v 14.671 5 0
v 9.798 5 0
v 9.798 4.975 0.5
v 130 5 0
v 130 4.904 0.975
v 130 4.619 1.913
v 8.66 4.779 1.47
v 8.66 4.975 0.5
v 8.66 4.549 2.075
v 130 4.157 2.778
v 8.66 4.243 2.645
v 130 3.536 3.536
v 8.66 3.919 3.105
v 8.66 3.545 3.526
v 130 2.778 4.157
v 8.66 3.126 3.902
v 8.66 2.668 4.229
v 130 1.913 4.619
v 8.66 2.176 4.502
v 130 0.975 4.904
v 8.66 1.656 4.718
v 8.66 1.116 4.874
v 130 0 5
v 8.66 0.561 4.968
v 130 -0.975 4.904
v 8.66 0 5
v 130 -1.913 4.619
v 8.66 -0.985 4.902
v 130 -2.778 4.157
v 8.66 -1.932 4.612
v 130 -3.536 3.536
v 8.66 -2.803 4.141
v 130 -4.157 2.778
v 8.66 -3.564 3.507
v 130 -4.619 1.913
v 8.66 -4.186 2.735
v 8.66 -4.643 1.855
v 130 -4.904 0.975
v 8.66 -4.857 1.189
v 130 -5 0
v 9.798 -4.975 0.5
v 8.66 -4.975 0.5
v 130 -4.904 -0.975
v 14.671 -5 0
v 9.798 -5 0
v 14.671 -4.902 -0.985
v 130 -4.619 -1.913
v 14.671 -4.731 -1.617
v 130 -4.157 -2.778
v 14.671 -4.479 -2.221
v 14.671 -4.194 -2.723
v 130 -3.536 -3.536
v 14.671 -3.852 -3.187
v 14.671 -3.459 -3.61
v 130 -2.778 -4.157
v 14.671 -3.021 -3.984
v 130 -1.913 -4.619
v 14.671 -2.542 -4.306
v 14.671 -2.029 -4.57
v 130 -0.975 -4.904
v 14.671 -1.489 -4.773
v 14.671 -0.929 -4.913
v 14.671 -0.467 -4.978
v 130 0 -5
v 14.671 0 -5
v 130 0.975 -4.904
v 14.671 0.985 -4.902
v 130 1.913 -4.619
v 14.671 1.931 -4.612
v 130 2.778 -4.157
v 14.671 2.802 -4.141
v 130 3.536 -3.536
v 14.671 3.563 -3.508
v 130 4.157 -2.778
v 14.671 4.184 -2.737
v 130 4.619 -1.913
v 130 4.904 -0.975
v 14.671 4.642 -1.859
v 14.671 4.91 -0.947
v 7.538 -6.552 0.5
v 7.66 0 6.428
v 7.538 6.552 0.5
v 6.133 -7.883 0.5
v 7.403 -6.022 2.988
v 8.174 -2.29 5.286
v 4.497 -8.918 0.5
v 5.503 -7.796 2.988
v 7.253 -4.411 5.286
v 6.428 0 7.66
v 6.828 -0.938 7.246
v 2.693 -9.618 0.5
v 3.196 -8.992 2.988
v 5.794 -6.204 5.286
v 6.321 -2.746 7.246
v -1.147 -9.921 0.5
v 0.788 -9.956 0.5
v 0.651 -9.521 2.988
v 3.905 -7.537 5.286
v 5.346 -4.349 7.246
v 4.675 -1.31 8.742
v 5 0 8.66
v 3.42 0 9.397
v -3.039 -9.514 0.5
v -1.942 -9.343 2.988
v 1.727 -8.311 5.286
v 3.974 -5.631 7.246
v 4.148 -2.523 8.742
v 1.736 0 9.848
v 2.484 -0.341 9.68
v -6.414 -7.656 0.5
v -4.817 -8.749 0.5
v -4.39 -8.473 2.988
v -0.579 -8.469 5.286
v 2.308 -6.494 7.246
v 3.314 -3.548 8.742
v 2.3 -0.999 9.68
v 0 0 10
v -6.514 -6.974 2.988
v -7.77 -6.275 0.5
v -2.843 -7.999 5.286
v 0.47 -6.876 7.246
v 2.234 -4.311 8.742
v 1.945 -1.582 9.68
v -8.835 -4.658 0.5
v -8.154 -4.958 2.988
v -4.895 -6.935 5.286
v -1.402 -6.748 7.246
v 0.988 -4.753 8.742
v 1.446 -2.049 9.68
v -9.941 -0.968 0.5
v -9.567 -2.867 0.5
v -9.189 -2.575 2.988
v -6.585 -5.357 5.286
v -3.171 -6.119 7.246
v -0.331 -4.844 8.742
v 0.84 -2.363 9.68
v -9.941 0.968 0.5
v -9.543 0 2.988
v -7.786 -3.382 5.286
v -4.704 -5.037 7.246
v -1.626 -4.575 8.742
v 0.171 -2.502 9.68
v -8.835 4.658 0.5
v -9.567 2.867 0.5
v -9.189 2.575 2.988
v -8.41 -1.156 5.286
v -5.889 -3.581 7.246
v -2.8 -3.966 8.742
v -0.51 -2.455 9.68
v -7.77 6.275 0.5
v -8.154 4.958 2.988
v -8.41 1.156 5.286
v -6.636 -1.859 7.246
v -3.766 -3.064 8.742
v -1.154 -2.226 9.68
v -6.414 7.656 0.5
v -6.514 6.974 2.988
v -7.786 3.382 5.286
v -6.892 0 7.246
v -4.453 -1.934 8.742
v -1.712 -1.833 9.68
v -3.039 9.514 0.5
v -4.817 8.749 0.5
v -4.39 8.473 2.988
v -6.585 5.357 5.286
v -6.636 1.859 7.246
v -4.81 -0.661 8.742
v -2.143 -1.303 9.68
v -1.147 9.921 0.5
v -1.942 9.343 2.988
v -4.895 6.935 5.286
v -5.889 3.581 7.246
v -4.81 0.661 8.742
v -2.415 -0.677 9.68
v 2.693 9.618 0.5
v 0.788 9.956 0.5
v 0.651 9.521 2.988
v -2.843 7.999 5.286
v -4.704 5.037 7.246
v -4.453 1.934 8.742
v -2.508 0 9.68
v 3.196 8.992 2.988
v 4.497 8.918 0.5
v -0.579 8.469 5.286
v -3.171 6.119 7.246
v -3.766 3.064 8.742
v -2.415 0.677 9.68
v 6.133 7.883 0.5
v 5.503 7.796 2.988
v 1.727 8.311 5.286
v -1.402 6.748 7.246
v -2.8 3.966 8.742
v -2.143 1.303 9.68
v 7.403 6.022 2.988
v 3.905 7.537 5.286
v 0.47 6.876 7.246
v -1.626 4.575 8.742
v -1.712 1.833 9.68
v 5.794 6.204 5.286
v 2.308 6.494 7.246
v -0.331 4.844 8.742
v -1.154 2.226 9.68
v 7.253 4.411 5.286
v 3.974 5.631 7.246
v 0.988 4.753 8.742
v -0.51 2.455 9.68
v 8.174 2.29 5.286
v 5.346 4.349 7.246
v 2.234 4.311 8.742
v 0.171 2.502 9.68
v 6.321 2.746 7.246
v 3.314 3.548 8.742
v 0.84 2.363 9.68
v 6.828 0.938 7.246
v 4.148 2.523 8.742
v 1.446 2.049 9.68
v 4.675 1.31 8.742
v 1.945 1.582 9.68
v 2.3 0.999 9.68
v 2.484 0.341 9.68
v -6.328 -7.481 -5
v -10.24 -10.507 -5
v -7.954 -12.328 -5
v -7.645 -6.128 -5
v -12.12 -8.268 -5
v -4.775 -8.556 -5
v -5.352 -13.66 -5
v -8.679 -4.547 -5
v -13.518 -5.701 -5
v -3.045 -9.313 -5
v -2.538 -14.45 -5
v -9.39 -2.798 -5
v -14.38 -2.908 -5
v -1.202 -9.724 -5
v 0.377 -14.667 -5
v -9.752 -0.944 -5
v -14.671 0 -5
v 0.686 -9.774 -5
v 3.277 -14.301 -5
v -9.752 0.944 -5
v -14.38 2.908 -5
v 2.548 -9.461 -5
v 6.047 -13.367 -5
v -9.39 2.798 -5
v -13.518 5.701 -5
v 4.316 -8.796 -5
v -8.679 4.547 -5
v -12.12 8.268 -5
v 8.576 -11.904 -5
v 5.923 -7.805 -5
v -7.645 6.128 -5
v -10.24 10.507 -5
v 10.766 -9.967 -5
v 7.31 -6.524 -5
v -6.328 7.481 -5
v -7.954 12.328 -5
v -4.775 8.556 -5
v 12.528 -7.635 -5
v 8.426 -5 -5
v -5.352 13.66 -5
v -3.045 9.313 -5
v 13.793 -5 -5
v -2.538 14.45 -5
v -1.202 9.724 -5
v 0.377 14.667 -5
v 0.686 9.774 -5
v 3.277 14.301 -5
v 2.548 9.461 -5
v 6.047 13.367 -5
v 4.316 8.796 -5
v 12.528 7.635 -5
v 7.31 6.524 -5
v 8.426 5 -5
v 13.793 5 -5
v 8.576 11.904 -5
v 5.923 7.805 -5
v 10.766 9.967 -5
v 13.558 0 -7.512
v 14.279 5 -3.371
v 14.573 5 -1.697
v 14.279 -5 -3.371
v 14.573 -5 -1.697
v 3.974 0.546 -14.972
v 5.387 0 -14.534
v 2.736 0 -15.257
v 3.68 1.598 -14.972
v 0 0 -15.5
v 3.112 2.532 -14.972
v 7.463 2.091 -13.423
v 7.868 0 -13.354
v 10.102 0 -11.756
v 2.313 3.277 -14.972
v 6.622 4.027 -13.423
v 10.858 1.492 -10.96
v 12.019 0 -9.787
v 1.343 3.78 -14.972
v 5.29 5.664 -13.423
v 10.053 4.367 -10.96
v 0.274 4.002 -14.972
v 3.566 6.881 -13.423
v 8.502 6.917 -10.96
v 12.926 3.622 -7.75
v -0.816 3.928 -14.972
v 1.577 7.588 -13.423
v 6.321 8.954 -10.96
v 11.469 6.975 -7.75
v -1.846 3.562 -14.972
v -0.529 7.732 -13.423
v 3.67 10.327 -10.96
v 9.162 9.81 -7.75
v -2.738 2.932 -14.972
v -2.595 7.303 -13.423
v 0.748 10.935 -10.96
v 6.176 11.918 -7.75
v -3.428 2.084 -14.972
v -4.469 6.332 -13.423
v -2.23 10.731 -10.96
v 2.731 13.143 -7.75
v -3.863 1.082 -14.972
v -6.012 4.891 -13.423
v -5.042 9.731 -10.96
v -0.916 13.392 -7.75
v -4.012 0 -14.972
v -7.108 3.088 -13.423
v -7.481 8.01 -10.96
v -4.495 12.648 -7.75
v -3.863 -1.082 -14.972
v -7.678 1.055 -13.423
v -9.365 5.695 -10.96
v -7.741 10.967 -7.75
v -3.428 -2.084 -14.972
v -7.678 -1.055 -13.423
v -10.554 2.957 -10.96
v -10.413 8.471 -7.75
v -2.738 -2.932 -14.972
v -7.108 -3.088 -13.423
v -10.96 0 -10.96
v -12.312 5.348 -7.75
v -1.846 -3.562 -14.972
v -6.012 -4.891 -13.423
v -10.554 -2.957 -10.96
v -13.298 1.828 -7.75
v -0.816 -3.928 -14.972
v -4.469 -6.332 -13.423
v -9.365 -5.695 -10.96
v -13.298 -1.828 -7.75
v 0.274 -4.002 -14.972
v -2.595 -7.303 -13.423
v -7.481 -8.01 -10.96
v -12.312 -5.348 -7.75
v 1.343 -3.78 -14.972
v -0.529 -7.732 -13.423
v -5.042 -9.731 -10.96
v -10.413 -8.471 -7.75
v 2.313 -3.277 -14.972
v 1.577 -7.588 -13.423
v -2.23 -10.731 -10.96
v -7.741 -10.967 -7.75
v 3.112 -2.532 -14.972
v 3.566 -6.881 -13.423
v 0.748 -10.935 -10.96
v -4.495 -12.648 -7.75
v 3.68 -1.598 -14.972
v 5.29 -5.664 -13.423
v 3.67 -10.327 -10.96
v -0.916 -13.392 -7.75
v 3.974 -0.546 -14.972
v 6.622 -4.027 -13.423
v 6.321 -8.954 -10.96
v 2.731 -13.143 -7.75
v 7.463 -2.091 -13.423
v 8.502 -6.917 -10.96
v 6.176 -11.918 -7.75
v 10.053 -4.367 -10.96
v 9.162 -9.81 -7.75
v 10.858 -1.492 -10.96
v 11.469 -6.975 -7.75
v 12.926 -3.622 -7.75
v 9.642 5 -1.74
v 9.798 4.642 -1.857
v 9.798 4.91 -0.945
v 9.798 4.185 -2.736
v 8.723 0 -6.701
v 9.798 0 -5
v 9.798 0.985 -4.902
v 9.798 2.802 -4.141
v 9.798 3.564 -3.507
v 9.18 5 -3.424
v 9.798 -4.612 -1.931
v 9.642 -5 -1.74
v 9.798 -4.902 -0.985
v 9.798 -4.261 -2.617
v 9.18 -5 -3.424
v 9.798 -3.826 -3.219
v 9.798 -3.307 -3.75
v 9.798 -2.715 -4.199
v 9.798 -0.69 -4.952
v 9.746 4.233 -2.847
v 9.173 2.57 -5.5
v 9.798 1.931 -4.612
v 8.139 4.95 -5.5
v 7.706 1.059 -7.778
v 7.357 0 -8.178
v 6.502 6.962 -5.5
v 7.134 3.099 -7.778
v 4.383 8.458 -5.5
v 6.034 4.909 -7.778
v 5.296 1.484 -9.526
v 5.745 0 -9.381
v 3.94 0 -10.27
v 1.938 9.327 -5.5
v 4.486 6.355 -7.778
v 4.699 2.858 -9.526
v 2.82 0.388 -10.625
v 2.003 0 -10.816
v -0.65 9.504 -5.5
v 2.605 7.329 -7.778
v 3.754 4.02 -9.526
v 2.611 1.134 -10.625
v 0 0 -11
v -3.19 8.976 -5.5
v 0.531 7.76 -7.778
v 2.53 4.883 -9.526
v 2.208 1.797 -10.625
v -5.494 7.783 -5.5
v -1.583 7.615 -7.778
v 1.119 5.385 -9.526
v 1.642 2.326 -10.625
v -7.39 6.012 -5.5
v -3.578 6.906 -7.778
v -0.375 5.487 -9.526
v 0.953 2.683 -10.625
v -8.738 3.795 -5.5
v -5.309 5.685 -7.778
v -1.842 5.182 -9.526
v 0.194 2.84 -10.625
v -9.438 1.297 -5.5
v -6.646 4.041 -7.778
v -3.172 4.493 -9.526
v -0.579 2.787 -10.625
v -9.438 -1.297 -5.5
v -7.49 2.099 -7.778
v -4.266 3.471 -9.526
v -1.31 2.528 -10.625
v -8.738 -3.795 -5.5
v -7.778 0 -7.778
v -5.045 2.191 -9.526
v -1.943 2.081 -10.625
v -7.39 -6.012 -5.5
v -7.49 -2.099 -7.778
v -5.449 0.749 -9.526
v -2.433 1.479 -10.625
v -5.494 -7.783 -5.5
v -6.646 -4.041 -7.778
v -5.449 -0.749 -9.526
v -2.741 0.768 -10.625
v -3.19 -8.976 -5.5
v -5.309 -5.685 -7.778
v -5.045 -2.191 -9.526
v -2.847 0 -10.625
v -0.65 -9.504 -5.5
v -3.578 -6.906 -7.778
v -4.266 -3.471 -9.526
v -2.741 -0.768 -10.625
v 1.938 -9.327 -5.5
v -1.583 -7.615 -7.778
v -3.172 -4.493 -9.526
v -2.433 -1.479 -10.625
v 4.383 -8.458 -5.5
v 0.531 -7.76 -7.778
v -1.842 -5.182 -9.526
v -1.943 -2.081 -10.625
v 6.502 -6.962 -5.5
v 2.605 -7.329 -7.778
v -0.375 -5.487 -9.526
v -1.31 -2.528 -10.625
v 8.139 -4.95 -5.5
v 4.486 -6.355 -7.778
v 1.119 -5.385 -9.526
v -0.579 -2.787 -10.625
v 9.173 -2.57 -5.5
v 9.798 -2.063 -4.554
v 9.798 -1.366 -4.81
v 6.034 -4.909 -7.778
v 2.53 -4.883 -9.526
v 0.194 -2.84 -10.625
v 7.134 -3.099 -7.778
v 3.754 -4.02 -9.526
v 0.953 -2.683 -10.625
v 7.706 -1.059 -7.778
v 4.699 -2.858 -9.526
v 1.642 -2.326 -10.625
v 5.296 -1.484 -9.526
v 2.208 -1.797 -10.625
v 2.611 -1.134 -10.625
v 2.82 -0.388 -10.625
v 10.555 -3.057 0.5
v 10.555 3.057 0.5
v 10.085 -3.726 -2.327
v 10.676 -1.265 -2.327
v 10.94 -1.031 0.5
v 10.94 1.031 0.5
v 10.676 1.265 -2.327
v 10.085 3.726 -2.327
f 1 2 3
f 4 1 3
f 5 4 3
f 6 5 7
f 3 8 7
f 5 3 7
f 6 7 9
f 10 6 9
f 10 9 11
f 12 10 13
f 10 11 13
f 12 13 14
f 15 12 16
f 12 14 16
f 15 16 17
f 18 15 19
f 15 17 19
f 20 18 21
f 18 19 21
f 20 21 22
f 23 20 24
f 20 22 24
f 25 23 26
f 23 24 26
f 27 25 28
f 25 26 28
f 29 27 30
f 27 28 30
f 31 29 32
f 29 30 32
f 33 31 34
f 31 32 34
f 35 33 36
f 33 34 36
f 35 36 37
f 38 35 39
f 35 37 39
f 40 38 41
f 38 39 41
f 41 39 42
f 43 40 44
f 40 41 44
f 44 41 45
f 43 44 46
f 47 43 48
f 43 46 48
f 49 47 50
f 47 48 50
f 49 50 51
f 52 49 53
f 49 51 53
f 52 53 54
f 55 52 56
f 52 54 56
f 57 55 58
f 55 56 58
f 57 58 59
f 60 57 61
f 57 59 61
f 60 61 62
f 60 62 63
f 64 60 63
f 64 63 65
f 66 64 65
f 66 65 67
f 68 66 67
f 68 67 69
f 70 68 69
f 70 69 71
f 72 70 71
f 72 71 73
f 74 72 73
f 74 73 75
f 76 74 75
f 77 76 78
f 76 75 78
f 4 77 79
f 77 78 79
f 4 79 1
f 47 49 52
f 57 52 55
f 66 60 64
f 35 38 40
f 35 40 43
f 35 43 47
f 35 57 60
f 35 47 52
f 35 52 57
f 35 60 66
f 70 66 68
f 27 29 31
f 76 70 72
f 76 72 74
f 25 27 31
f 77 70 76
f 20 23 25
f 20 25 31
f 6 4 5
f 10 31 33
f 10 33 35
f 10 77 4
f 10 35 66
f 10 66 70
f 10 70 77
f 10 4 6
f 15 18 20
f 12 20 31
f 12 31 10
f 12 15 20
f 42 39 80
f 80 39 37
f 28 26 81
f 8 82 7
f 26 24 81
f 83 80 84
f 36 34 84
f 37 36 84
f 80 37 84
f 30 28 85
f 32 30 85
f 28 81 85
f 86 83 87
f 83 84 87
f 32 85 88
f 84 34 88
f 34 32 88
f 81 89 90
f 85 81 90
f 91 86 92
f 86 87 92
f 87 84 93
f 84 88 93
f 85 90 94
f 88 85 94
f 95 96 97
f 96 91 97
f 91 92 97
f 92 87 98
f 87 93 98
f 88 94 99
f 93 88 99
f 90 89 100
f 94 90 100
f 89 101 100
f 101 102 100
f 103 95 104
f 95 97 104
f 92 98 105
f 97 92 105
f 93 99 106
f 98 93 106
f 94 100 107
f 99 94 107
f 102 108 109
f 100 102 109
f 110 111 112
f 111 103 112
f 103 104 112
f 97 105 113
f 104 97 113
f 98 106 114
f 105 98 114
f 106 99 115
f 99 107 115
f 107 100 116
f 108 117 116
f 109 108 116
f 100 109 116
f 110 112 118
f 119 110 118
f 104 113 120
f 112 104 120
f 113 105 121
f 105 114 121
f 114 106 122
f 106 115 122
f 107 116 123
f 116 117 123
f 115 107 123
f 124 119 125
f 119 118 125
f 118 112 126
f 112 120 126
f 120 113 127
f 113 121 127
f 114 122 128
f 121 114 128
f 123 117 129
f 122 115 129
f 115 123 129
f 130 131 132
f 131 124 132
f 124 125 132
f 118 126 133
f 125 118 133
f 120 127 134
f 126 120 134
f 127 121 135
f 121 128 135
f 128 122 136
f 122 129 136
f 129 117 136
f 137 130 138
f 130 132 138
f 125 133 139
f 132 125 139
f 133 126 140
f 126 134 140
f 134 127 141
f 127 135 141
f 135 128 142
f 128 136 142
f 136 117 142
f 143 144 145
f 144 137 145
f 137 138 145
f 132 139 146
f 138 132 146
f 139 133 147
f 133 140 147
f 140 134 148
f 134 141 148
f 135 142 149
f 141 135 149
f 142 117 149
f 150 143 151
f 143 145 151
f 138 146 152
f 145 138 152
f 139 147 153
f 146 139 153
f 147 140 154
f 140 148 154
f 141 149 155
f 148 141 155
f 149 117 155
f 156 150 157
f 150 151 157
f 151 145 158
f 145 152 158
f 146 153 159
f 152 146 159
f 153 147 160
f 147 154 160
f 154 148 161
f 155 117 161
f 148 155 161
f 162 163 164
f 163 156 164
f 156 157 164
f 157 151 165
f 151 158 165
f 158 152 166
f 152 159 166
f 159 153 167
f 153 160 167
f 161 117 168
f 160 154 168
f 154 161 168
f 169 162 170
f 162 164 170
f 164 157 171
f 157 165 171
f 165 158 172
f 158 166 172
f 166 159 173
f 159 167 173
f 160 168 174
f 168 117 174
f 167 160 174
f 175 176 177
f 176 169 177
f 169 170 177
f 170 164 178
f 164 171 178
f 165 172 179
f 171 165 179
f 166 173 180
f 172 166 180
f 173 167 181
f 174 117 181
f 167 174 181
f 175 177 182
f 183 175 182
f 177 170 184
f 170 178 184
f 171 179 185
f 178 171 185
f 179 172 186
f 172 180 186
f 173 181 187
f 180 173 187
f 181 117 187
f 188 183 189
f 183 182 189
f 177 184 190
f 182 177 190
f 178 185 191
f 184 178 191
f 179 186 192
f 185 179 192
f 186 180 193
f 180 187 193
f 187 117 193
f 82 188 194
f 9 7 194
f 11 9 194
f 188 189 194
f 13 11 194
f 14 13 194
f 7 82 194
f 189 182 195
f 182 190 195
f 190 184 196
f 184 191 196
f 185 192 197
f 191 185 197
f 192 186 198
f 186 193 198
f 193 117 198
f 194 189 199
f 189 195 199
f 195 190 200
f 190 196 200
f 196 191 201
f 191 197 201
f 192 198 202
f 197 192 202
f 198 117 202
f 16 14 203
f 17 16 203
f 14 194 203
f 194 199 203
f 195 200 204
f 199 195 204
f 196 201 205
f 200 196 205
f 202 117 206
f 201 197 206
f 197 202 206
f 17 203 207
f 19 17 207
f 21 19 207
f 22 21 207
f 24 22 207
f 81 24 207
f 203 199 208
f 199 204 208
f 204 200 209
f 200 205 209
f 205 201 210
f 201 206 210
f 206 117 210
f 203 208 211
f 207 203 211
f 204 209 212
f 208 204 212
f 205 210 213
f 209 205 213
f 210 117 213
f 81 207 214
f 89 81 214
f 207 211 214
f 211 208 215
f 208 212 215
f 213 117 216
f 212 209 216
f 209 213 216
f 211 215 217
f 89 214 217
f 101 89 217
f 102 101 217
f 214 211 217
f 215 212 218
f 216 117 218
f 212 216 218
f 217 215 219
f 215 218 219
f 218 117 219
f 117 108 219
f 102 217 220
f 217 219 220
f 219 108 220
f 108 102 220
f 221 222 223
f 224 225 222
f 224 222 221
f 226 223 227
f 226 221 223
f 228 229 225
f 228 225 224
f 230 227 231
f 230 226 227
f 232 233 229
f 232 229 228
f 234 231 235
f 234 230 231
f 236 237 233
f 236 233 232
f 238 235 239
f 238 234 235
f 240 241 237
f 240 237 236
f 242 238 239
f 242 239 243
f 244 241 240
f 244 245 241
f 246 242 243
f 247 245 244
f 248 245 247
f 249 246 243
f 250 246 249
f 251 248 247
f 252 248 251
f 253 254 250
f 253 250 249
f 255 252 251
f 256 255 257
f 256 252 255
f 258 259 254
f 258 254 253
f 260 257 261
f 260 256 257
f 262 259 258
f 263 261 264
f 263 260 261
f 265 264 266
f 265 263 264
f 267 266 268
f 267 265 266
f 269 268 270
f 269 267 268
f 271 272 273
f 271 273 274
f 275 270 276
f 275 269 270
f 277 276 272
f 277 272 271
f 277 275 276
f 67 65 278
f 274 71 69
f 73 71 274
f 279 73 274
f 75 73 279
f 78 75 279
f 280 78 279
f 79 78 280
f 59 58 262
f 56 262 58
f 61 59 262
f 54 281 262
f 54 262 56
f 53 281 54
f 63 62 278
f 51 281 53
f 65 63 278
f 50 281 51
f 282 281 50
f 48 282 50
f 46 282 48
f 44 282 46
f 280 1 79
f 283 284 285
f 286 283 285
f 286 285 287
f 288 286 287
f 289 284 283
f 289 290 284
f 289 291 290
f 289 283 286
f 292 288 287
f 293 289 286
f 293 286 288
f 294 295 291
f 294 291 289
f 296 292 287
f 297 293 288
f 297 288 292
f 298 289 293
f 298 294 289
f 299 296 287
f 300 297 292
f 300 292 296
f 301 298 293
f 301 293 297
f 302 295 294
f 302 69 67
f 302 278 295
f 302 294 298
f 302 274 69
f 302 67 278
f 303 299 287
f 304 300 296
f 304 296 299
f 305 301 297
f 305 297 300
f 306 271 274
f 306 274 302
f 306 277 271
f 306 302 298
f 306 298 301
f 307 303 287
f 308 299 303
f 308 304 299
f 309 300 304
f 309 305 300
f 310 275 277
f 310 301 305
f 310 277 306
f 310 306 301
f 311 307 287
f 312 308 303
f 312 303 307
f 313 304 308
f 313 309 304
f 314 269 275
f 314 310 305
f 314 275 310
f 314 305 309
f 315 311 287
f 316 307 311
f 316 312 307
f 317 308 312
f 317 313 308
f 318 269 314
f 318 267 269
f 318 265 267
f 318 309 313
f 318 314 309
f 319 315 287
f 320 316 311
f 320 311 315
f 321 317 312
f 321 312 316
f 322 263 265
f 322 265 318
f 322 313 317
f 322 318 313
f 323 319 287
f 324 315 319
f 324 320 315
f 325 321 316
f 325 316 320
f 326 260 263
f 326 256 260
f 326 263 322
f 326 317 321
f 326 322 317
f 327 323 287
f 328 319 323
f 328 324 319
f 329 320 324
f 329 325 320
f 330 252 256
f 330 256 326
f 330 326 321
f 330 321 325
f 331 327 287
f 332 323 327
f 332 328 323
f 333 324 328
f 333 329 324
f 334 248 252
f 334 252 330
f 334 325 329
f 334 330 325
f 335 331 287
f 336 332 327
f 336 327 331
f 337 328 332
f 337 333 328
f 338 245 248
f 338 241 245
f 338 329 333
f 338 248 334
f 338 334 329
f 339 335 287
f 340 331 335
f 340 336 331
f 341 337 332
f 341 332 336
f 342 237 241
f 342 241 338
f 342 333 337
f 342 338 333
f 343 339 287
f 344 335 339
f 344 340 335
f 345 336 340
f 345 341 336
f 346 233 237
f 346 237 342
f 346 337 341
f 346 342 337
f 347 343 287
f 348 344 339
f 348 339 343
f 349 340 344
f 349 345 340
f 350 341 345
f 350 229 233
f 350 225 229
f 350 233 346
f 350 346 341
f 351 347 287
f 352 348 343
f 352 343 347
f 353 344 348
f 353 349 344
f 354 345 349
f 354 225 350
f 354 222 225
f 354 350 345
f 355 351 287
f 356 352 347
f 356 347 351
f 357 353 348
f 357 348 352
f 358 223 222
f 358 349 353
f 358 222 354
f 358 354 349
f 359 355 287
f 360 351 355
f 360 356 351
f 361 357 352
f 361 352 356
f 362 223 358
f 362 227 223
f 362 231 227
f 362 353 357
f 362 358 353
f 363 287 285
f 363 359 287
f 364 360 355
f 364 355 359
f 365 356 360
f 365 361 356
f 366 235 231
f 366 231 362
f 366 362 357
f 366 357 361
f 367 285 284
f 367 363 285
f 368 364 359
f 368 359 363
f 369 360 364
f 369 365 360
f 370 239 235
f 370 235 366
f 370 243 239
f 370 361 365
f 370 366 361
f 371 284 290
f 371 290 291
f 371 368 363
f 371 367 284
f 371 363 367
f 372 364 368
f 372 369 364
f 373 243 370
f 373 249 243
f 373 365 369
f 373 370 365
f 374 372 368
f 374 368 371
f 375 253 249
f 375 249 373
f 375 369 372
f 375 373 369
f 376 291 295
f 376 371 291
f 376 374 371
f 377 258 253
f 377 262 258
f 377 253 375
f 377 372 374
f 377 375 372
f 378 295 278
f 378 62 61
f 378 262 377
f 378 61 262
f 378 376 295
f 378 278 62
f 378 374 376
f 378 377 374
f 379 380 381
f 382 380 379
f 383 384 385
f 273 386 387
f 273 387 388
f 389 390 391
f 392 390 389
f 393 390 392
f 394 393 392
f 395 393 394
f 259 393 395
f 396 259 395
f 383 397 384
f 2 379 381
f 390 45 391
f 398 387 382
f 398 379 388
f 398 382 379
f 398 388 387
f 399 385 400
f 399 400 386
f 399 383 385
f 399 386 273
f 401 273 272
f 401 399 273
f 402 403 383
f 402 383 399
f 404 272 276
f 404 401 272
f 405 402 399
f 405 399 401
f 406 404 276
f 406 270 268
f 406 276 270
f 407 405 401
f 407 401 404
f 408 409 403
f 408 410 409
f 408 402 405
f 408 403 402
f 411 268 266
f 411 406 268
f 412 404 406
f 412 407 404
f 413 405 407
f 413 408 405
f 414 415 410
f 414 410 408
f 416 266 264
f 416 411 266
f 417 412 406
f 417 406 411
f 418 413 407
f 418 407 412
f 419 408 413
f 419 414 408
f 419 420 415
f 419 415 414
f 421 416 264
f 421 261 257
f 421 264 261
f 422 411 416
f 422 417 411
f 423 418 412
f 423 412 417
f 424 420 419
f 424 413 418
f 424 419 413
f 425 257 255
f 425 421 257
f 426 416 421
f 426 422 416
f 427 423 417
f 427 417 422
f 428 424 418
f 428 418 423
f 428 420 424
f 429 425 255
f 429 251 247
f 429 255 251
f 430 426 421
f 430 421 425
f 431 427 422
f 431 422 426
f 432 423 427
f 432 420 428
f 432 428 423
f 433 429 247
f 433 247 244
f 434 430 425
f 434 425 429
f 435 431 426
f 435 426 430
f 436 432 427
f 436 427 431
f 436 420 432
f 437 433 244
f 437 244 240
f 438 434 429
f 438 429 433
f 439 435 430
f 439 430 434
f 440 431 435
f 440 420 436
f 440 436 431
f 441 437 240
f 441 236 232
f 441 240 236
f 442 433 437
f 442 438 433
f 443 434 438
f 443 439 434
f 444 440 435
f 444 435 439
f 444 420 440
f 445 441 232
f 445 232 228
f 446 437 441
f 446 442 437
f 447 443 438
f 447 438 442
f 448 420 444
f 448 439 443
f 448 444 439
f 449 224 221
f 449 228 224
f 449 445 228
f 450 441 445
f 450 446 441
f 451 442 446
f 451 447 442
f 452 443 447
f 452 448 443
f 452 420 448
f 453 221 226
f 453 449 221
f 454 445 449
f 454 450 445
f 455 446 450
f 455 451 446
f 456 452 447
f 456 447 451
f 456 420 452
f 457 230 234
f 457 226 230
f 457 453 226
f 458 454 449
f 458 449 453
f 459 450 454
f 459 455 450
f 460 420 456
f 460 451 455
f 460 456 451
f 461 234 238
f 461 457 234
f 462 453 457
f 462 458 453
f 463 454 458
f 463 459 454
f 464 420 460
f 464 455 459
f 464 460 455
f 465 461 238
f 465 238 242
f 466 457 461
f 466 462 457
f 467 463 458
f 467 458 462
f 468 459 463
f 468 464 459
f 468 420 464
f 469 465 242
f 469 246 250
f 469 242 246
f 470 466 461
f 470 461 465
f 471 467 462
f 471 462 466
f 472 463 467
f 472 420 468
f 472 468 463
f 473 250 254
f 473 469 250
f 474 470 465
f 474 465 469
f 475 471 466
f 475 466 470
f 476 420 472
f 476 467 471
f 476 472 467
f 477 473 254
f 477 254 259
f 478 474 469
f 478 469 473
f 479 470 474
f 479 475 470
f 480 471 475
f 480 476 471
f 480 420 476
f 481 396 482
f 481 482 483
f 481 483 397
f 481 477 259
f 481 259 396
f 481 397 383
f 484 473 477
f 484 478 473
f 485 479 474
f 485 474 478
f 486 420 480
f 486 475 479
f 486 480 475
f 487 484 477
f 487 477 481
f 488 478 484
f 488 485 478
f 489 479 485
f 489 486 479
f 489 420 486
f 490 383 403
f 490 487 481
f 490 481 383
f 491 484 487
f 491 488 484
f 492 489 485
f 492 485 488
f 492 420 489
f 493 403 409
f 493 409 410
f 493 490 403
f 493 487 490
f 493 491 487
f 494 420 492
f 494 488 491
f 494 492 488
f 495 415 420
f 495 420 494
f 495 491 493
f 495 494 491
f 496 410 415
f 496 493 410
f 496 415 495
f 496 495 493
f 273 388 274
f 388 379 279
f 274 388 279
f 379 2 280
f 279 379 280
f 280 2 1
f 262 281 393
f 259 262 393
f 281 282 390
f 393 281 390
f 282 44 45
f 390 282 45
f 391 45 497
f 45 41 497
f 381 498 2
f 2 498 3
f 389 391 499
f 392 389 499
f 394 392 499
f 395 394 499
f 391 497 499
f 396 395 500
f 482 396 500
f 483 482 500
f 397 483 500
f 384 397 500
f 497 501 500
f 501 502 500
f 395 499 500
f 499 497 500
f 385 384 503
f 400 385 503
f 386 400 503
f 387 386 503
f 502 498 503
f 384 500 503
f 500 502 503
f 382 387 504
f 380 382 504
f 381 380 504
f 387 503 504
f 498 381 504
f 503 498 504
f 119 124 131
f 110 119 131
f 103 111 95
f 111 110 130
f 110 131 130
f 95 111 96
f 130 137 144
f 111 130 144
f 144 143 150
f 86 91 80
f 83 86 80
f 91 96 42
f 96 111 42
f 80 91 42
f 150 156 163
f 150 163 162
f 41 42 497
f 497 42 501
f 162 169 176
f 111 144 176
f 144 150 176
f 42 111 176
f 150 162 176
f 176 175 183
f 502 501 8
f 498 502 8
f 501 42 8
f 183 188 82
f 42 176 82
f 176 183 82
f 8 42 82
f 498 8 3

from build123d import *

# Parameters (mm, degrees)
F2_R          = 10
F3_DEPTH      = 0.5
F3_DEPTH_BACK = 10.001
F6_R          = 5
F7_DEPTH      = 130
F11_DEPTH     = 5


with BuildPart() as f1:
    # F0 (on Front) → F1 (revolve)
    with BuildSketch(Plane.XZ):
        with BuildLine():
            Line((0, 10), (0, -10))
            ThreePointArc((0, -10), (10, 0), (0, 10))
        make_face()
    revolve(axis=Axis((0, 0, 0), (0, 0, -1)))

    # F2 (on Top) → F3 (cut, two sides)
    with BuildSketch(Plane.XY) as f3_sk:
        Circle(F2_R)
    extrude(amount=F3_DEPTH, mode=Mode.SUBTRACT)
    extrude(f3_sk.sketch, amount=-F3_DEPTH_BACK, mode=Mode.SUBTRACT)



with BuildPart() as f5:
    # F4 (on Front) → F5 (revolve)
    with BuildSketch(Plane.XZ):
        with BuildLine():
            ThreePointArc((11, 0), (7.7781745931, -7.7781745931), (0, -11))
            Line((0, -11), (0, -15.5))
            ThreePointArc((0, -15.5), (10.9601551084, -10.9601551084), (15.5, 0))
            Line((15.5, 0), (11, 0))
        make_face()
    revolve(axis=Axis((0, 0, -13.25), (0, 0, 1)))


with BuildPart() as f1_1:
    add(f1.part)

    add(f5.part)  # F7 merges F5
    # F6 (on Right) → F7 (join)
    with BuildSketch(Plane.YZ):
        Circle(F6_R)
    extrude(amount=F7_DEPTH)

    # F8 (on Front) → F9 (revolve, cut)
    with BuildSketch(Plane.XZ):
        with BuildLine():
            Line((0, 0.5), (0, -11))
            ThreePointArc((0, -11), (7.9529868603, -7.5993420768), (10.9886304879, 0.5))
            Line((10.9886304879, 0.5), (0, 0.5))
        make_face()
    revolve(axis=Axis((0, 0, -5.25), (0, 0, 1)), mode=Mode.SUBTRACT)

    # F10 (on Top) → F11 (cut)
    with BuildSketch(Plane.XY):
        with BuildLine():
            Line((0, 5), (14.6714007511, 5))
            ThreePointArc((14.6714007511, 5), (-15.5, 0), (14.6714007511, -5))
            Line((14.6714007511, -5), (0, -5))
            Line((0, -5), (0, 5))
        make_face()
    extrude(amount=-F11_DEPTH, mode=Mode.SUBTRACT)


solid = f1_1.part
